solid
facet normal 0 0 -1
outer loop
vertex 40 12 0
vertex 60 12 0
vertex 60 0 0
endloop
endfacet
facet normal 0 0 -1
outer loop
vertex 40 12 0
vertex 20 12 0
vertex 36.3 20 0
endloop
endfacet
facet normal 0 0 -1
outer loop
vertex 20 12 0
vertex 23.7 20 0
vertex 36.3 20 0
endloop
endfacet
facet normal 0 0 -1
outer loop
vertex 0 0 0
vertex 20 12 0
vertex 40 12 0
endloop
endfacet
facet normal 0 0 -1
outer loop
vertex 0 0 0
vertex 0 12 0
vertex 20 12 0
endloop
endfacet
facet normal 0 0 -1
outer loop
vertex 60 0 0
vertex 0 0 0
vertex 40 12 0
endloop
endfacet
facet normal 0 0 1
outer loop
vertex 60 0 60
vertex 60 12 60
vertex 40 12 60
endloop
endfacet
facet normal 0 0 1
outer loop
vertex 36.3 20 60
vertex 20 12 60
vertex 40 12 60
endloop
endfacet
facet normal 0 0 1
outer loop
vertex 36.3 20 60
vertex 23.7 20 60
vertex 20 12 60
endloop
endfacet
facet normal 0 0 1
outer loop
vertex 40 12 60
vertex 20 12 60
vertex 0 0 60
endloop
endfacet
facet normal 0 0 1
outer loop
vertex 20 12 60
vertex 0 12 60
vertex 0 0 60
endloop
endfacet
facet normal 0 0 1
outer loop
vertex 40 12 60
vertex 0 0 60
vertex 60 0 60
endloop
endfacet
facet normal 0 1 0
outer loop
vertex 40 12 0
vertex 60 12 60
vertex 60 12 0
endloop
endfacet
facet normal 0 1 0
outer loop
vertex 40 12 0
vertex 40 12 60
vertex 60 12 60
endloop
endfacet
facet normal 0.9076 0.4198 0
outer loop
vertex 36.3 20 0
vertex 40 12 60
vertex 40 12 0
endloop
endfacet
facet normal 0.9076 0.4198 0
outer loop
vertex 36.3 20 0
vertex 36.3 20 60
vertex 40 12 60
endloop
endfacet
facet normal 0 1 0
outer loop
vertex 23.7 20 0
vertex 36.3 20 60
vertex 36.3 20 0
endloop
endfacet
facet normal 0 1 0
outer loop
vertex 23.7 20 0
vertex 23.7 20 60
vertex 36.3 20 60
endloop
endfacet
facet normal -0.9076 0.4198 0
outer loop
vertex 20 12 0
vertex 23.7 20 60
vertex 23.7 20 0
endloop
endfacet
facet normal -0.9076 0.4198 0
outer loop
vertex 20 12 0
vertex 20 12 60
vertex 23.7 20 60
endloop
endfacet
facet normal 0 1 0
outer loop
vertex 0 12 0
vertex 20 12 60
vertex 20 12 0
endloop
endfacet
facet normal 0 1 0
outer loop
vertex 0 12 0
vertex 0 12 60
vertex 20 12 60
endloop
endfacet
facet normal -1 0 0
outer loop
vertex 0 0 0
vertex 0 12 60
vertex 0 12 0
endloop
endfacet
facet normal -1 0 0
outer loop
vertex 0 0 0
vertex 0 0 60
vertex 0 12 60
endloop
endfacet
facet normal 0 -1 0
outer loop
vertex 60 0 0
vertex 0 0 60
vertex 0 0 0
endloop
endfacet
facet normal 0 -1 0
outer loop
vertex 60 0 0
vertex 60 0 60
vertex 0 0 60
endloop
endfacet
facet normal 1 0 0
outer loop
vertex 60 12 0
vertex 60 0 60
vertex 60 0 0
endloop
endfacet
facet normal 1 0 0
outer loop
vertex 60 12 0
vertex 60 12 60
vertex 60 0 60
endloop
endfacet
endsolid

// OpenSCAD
$fn = 32;

// ----------------------------------------------------------------------
// V guide rail: dovetail, 60 mm wide
// ----------------------------------------------------------------------

// --- parameters (mm) ---
rail_w = 60;              // rail width, X
base_t = 12;              // base plate thickness
v_depth = 8;              // V feature depth / height
v_half_w = 10;            // half width of the V at the base face
plate_t = 60;             // rail length, Z (the extrusion height)
top_half_w = 6.3;         // half width at the dovetail top

dovetail_base = 2 * v_half_w;  // dovetail width at the base
dovetail_top = 2 * top_half_w;  // dovetail width at the top

profile = [[0, 0], [60, 0], [60, 12], [40, 12], [36.3, 20], [23.7, 20], [20, 12], [0, 12]];  // primary outline, 8 points, counter clockwise

// --- the one profile operation ---
linear_extrude(height = plate_t) polygon(points = profile);
